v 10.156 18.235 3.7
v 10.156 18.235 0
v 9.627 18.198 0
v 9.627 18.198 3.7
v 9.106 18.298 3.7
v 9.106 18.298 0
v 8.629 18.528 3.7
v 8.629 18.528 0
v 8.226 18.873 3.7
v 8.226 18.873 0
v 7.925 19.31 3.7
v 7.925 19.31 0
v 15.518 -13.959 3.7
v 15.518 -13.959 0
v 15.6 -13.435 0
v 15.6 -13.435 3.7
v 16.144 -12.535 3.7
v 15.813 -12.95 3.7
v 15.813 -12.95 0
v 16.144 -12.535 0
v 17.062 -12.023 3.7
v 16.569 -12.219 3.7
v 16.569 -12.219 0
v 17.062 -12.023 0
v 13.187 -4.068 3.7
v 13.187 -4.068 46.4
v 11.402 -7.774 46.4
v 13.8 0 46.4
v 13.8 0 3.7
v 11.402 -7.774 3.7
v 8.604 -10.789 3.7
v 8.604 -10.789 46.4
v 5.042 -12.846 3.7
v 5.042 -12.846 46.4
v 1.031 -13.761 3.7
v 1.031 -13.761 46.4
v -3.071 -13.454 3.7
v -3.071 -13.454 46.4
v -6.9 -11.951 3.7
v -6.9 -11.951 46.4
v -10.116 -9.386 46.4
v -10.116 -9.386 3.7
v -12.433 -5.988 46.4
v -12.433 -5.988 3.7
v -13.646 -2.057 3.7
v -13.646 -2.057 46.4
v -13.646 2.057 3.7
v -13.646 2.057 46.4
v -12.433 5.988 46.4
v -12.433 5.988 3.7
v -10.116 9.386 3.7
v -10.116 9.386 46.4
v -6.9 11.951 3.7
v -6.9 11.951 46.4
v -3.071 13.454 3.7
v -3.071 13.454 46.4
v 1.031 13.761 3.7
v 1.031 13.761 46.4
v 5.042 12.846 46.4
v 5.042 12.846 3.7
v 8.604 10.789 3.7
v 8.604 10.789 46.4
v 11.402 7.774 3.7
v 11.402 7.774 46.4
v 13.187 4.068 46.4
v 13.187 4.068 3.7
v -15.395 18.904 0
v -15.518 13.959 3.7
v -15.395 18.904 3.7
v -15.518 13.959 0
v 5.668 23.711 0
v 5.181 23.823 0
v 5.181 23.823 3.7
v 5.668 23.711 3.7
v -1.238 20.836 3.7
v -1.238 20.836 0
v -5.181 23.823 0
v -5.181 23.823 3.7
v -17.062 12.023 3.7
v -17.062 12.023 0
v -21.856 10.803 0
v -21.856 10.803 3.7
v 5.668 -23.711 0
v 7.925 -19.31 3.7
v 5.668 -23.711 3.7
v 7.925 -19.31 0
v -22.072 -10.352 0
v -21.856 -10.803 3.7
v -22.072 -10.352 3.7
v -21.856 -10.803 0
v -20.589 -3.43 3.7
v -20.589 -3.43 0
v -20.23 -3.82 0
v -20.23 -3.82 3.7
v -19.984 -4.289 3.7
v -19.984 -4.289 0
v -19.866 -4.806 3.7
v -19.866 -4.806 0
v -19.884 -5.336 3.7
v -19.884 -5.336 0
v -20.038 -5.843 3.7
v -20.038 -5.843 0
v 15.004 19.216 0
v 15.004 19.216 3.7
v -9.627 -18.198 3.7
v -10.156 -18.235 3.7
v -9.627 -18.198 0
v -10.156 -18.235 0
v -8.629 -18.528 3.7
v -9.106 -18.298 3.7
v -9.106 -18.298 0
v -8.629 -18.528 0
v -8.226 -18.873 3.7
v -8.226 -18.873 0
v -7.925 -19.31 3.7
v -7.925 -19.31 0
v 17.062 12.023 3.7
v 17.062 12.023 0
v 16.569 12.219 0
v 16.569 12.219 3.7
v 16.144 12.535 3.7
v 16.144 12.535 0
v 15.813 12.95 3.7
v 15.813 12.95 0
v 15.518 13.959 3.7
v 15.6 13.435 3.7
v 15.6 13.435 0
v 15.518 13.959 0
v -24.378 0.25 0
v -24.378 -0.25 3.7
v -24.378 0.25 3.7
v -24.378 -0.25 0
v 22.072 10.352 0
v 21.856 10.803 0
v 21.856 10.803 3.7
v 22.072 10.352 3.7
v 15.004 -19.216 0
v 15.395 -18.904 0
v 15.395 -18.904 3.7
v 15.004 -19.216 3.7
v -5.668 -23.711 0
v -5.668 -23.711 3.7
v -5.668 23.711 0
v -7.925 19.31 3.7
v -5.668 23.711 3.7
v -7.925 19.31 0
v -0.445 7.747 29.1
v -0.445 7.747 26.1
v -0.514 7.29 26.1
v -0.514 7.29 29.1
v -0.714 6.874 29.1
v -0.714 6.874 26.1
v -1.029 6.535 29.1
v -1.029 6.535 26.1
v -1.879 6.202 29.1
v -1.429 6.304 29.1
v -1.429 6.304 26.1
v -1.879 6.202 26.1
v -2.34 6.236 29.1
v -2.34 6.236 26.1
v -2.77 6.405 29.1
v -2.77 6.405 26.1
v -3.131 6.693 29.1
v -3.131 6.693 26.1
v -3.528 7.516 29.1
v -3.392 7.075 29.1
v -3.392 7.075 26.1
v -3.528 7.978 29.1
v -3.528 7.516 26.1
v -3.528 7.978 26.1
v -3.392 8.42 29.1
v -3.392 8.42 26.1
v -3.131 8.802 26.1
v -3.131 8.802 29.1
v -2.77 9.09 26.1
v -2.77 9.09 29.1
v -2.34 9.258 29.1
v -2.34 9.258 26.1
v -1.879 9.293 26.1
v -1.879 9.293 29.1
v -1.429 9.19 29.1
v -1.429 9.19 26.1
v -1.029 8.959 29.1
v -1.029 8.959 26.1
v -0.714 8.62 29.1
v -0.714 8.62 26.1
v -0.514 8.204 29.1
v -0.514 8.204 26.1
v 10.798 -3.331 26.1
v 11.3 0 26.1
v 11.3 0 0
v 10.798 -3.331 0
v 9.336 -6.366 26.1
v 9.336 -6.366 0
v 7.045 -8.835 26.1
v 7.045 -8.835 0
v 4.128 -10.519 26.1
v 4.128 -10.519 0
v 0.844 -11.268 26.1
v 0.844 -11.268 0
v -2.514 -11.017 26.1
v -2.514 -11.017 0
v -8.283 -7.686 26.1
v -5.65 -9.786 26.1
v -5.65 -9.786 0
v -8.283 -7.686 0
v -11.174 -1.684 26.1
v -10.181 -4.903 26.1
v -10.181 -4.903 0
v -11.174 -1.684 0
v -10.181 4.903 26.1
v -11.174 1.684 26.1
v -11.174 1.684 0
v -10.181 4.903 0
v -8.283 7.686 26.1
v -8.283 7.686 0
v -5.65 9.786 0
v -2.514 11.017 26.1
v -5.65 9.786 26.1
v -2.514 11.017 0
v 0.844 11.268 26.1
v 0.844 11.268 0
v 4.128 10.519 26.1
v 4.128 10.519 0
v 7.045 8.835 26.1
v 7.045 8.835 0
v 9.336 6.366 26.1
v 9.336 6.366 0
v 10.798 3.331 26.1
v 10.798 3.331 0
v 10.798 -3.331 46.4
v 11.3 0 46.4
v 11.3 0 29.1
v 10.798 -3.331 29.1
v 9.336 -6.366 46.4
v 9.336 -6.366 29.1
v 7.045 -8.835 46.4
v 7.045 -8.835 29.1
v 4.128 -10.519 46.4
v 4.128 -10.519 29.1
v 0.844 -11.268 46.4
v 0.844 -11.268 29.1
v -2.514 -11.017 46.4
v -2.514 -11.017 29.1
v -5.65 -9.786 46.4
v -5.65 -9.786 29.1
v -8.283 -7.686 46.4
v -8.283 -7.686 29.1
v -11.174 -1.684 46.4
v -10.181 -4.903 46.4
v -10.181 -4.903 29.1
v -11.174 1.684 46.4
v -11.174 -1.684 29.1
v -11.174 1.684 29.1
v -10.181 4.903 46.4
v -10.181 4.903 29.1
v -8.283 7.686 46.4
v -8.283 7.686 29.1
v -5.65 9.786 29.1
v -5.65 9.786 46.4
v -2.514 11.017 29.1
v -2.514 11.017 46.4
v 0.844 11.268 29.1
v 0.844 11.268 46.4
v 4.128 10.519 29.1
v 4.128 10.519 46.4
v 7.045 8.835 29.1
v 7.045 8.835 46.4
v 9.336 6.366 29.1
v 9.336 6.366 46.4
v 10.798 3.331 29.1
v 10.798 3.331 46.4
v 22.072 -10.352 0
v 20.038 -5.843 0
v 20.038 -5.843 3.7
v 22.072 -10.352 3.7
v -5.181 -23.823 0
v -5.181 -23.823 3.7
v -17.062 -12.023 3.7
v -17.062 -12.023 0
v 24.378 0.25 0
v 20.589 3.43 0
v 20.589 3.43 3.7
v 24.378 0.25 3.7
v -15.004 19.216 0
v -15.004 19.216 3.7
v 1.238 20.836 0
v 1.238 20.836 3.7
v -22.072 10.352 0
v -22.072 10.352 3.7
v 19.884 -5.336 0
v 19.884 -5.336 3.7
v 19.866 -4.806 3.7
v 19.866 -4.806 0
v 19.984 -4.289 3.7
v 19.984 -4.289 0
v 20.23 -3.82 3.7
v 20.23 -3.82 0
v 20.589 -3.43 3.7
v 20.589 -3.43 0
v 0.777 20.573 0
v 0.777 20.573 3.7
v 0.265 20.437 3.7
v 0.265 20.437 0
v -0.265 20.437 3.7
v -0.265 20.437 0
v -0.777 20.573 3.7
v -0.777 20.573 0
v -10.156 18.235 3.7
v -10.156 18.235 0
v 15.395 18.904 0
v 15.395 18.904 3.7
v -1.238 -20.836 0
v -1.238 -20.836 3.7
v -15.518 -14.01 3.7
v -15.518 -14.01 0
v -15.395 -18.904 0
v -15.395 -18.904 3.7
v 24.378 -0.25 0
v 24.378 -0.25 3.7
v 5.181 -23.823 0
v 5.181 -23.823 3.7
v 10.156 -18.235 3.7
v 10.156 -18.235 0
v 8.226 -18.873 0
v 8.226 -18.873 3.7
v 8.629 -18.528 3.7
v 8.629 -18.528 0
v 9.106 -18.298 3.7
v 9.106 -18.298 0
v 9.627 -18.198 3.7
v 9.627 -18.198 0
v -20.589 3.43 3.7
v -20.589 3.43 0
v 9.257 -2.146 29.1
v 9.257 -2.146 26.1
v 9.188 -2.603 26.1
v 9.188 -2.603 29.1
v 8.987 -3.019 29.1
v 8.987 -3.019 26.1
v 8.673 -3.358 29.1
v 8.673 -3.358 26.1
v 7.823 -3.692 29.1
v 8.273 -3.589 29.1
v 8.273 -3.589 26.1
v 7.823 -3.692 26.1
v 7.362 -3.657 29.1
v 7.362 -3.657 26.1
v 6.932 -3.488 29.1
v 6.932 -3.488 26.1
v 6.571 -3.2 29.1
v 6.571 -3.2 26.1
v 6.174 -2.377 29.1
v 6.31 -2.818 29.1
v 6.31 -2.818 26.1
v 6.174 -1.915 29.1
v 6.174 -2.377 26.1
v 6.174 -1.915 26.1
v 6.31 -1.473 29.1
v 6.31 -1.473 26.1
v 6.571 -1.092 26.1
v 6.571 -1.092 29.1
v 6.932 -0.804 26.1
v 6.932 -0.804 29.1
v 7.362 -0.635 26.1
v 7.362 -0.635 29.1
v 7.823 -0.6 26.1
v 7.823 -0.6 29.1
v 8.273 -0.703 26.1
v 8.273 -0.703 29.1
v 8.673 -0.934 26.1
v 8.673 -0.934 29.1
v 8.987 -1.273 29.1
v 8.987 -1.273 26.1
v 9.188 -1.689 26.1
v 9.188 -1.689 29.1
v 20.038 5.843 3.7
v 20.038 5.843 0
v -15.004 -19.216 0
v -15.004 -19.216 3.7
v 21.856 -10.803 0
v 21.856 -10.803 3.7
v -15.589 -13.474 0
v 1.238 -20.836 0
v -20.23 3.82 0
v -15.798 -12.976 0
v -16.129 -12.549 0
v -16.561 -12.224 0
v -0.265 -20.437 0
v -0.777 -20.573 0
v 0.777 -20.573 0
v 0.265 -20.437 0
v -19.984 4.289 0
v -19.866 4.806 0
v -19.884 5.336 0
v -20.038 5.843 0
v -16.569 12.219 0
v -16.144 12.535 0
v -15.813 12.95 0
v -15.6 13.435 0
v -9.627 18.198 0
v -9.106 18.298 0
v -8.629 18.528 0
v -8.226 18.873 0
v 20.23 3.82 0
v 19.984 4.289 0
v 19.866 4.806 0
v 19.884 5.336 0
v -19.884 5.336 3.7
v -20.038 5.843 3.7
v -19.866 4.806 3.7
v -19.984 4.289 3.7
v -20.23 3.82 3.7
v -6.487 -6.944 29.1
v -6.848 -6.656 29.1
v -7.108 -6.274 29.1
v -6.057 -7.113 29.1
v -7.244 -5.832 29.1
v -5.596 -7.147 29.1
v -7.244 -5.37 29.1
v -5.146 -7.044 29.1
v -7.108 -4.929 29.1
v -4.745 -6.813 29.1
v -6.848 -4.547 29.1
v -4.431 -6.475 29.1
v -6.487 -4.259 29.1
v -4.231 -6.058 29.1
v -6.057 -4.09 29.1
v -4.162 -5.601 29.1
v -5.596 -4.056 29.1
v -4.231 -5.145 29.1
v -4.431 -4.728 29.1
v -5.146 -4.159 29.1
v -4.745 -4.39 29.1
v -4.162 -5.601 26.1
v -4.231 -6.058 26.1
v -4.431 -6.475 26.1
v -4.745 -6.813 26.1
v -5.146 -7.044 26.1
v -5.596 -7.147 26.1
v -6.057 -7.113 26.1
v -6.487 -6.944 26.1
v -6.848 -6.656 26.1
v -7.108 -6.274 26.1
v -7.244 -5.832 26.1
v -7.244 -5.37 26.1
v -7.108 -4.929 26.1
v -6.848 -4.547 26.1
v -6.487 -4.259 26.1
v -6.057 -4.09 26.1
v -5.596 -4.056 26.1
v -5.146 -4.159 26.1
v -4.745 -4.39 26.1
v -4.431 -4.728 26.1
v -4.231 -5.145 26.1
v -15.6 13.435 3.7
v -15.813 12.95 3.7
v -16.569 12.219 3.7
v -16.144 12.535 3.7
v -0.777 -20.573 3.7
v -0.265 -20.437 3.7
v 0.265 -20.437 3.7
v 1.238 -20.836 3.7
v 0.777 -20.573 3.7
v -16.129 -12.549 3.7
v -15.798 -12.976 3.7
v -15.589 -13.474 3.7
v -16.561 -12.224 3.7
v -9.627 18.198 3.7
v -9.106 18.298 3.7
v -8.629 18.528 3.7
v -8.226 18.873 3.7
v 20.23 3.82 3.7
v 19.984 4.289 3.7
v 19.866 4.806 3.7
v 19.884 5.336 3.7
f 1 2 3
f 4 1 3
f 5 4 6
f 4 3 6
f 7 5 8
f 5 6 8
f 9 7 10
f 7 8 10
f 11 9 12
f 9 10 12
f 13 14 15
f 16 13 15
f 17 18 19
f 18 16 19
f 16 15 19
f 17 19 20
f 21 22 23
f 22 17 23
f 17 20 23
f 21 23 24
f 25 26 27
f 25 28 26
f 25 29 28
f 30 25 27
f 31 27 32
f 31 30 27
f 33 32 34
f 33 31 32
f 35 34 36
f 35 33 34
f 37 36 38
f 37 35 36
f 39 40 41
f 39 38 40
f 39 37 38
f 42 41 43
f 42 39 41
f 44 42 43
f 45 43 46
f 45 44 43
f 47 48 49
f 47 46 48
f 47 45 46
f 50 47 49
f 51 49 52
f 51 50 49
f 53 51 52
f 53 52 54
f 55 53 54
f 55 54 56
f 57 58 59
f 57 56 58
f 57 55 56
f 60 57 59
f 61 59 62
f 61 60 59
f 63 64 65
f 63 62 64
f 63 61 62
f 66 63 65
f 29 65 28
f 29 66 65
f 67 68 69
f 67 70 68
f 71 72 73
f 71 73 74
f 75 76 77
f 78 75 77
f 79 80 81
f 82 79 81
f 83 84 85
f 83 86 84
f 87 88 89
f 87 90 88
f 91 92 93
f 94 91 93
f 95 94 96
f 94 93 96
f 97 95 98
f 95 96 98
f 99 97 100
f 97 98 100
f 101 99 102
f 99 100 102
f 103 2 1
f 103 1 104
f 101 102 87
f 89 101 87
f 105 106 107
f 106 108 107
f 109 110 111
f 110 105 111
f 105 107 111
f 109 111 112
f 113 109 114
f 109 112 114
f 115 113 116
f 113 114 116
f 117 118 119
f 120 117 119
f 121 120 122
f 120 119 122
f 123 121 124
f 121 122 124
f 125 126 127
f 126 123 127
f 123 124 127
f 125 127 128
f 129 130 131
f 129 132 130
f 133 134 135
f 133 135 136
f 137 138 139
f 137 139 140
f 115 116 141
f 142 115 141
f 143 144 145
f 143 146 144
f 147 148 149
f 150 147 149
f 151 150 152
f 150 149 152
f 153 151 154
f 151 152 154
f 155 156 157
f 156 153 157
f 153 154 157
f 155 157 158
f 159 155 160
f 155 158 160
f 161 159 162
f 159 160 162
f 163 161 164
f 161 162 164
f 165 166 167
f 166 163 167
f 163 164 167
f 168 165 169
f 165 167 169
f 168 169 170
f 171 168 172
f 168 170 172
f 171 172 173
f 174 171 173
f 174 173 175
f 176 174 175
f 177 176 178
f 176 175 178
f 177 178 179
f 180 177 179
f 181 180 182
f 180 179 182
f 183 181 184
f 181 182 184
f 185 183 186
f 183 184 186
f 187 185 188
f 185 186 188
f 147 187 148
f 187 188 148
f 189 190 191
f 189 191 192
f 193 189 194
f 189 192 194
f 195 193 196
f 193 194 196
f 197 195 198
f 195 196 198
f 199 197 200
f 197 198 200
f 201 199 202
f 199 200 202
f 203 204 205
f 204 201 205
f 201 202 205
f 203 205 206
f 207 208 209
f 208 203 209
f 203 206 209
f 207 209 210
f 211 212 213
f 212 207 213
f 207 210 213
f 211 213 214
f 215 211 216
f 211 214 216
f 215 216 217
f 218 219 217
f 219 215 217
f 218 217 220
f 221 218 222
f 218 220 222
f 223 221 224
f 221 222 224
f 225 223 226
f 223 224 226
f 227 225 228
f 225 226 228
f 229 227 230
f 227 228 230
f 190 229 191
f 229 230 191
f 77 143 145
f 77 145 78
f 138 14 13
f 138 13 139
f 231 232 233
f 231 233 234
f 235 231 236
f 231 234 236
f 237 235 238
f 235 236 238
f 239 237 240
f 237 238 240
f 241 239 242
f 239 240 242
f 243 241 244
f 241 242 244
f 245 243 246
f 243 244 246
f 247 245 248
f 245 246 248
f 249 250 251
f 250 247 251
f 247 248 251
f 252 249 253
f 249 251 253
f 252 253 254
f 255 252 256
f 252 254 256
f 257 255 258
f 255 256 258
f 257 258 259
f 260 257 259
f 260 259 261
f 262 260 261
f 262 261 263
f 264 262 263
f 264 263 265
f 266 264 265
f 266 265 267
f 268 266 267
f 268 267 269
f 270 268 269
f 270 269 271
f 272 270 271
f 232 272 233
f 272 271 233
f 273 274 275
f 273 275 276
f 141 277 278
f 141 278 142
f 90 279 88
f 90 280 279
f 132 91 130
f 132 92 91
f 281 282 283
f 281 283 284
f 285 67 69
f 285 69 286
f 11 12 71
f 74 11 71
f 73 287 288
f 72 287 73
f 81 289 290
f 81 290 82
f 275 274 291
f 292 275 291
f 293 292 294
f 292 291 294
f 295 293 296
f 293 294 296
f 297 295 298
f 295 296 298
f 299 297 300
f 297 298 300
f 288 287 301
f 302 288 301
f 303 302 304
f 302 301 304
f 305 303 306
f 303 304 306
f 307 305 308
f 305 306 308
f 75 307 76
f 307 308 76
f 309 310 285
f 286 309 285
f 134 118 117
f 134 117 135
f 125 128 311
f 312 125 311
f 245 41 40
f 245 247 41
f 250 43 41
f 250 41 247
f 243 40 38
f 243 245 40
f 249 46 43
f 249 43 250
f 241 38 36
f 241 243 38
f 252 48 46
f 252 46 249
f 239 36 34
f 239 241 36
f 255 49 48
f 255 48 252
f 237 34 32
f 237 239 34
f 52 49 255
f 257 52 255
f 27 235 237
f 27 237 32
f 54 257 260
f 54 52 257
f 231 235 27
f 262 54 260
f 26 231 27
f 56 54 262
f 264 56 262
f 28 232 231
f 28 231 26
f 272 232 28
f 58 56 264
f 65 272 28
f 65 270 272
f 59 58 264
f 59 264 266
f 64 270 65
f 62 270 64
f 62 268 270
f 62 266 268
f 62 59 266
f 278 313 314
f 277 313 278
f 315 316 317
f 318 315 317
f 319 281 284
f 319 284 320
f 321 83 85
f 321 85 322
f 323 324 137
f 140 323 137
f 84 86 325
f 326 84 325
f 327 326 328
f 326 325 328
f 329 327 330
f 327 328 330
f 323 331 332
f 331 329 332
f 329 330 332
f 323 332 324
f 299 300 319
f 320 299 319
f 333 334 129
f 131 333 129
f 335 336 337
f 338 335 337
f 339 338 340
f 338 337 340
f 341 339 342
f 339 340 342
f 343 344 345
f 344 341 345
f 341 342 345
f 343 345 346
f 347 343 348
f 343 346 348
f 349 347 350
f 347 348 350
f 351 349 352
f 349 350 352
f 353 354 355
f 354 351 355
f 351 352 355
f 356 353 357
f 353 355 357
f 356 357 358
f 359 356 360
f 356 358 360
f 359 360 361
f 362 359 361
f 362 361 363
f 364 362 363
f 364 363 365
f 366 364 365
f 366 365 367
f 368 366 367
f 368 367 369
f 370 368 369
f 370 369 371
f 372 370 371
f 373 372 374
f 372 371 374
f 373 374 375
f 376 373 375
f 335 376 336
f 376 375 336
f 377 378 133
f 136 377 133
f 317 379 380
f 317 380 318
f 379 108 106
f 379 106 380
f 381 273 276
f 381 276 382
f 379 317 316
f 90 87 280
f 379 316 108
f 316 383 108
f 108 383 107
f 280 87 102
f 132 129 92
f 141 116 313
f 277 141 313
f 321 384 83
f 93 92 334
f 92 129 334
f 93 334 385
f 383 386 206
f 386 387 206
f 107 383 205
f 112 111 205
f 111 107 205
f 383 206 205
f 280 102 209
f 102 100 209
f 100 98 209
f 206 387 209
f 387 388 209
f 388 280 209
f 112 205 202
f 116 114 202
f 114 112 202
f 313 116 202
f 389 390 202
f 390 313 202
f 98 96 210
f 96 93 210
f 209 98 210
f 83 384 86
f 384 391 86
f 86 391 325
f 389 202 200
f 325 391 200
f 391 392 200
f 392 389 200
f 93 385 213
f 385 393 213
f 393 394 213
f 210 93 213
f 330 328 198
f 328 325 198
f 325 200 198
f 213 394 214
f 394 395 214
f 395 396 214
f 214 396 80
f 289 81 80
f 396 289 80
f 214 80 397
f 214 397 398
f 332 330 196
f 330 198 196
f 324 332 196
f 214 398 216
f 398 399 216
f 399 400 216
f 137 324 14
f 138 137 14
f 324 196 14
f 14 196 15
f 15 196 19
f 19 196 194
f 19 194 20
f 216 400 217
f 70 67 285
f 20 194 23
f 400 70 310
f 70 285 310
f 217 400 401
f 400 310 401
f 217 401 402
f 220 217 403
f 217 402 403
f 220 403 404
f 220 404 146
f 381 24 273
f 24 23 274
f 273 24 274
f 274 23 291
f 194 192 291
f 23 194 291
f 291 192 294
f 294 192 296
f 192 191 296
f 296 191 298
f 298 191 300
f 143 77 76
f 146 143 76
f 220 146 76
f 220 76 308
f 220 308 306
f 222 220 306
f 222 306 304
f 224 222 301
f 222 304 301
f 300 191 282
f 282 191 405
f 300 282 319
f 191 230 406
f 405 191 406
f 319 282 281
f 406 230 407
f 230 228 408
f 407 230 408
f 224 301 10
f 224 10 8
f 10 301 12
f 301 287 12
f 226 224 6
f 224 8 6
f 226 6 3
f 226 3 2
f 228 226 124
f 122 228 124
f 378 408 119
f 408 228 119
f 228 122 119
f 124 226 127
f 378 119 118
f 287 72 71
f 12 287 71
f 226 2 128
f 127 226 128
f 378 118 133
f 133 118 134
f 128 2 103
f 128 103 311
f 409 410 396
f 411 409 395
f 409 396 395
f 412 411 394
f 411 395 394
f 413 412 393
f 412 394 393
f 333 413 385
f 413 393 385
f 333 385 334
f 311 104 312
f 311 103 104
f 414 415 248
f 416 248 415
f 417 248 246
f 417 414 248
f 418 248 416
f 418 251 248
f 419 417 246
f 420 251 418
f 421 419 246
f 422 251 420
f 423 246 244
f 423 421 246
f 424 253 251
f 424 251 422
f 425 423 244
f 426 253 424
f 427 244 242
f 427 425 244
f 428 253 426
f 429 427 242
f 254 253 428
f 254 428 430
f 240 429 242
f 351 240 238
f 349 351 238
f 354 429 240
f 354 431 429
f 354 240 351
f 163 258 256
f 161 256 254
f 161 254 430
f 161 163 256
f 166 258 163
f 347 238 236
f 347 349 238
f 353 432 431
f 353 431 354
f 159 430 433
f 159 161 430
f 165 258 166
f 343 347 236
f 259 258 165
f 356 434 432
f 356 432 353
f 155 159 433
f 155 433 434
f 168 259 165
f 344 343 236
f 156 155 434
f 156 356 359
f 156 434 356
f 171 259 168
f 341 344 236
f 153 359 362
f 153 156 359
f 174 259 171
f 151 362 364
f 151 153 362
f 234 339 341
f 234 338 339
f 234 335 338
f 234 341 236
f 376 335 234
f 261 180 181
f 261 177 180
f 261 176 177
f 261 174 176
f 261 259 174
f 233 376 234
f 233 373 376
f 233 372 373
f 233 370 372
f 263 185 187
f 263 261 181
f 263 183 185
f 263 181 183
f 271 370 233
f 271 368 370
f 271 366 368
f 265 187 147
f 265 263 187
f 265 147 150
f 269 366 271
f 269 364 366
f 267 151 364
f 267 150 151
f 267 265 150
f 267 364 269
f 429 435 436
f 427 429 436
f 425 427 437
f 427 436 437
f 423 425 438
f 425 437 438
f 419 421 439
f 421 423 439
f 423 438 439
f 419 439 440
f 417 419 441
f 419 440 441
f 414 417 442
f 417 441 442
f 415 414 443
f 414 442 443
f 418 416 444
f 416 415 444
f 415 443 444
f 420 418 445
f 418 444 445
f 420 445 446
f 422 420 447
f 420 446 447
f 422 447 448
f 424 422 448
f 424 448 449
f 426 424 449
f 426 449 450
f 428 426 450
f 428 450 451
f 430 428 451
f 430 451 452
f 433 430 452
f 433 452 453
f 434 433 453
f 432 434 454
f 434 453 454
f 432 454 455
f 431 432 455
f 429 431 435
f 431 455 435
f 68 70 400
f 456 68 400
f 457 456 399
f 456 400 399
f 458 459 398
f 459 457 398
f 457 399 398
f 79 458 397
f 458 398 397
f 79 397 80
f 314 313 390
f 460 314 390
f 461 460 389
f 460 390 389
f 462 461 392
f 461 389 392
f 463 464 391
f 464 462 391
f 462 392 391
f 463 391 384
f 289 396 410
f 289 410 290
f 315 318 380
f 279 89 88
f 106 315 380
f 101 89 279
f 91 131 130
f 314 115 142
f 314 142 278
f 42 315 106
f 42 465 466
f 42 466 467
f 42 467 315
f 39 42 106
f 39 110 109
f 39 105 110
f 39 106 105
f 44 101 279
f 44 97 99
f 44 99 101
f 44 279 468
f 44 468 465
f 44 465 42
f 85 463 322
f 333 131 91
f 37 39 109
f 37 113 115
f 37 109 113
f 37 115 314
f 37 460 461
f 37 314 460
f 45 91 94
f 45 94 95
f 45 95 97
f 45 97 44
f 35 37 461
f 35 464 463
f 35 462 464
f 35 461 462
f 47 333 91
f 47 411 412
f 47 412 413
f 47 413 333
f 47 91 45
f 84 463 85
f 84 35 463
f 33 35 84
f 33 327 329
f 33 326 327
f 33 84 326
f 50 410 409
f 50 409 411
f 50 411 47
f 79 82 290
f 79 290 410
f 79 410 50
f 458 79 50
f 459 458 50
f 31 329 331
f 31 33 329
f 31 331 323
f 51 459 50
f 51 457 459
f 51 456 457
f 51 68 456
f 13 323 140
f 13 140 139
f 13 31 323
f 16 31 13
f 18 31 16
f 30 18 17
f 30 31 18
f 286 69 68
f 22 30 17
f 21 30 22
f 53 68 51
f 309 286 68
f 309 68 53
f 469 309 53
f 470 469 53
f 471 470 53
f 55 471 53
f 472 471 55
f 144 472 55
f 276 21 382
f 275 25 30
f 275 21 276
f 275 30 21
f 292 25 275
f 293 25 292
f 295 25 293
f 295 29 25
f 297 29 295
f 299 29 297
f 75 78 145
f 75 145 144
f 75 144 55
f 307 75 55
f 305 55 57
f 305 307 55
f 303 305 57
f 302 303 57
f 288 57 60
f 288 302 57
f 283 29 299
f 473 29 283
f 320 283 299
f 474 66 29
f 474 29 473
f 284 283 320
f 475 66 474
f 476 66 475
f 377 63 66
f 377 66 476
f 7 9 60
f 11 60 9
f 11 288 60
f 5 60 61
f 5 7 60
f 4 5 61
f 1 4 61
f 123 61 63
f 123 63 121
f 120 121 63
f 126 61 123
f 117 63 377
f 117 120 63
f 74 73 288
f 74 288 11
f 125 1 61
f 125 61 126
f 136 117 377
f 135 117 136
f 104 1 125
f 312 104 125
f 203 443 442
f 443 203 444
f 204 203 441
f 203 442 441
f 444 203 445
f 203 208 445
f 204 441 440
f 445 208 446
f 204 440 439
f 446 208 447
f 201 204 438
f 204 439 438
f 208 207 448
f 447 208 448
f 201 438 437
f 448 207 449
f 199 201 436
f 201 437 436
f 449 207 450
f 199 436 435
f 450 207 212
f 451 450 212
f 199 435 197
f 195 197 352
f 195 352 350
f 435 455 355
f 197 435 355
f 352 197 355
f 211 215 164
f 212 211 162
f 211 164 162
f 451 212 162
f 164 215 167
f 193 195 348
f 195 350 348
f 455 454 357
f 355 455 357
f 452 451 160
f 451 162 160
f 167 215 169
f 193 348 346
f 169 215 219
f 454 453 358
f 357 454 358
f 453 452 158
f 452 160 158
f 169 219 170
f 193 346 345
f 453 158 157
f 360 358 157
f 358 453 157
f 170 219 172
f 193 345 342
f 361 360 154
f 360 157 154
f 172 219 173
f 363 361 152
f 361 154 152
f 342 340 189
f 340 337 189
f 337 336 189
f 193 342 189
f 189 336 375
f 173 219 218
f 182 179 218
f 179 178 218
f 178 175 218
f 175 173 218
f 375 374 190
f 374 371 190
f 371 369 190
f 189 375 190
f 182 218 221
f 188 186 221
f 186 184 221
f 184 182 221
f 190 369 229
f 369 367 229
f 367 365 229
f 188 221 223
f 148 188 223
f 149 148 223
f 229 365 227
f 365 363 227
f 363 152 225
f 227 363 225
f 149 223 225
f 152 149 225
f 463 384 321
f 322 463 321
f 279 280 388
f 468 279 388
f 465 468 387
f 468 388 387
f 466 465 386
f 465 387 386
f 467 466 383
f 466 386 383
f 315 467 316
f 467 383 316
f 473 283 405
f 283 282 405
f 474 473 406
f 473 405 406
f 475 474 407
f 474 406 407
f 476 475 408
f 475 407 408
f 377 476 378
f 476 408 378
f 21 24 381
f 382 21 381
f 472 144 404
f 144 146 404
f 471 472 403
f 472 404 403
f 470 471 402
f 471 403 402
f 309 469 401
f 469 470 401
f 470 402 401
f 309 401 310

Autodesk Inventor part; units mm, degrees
ref_plane "YZ Plane" through (0, 0, 0) normal (1, 0, 0) x (0, 1, 0)
ref_plane "XZ Plane" through (0, 0, 0) normal (0, 1, 0) x (-1, 0, 0)
ref_plane "XY Plane" through (0, 0, 0) normal (0, 0, 1) x (1, 0, 0)
sketch "Эскиз1" plane through (0, 0, 0) normal (0, 0, 1) x (1, 0, 0)
  circle A0 centre (0, 0) radius 22.47
  line L0 (21.9066, 5) -> (21.9066, -5)
  circle A1 centre (21.9066, -5) radius 2.05
  circle A2 centre (21.9066, 5) radius 2.05
  line L1 (21.9066, 5) -> (0, 0)
  line L2 (0, 0) -> (21.9066, -5)
  line L3 (21.9066, 5) -> (13.9325, -4.5032)
  circle A3 centre (0, 0) radius 15.4921
  line L4 (20.5889, 3.4296) -> (24.3782, 0.25)
  line L5 (0, 0) -> (4.0279, 0)
  line L6 (20.5889, -3.4296) -> (24.3782, -0.25)
  line L7 (24.3782, 0.25) -> (24.3782, -0.25)
  line L8 (21.9066, -5) -> (14.1251, 4.2737)
  line L9 (21.8556, 10.8026) -> (22.0725, 10.3521)
  circle A4 centre (21.9066, 5.0001) radius 2.05
  line L10 (20.038, 5.8432) -> (22.0725, 10.3521)
  line L11 (17.0619, 12.0232) -> (21.8556, 10.8026)
  circle A5 centre (17.5678, 14.0098) radius 2.05
  line L12 (15.0041, 19.2155) -> (15.395, 18.9038)
  circle A6 centre (17.5677, 14.0099) radius 2.05
  line L13 (15.5184, 13.9587) -> (15.395, 18.9038)
  line L14 (10.1556, 18.2354) -> (15.0041, 19.2155)
  circle A7 centre (9.7494, 20.2448) radius 2.05
  line L15 (5.1809, 23.8227) -> (5.6684, 23.7114)
  circle A8 centre (9.7493, 20.2448) radius 2.05
  line L16 (7.9251, 19.3096) -> (5.6684, 23.7114)
  line L17 (1.2378, 20.8359) -> (5.1809, 23.8227)
  circle A9 centre (0, 22.47) radius 2.05
  line L18 (-5.6684, 23.7114) -> (-5.1809, 23.8227)
  circle A10 centre (0, 22.47) radius 2.05
  line L19 (-1.2378, 20.8359) -> (-5.1809, 23.8227)
  line L20 (-7.9251, 19.3096) -> (-5.6684, 23.7114)
  circle A11 centre (-9.7493, 20.2448) radius 2.05
  line L21 (-15.395, 18.9038) -> (-15.0041, 19.2155)
  circle A12 centre (-9.7494, 20.2448) radius 2.05
  line L22 (-10.1556, 18.2354) -> (-15.0041, 19.2155)
  line L23 (-15.5184, 13.9587) -> (-15.395, 18.9038)
  circle A13 centre (-17.5677, 14.0099) radius 2.05
  line L24 (-22.0725, 10.3521) -> (-21.8556, 10.8026)
  circle A14 centre (-17.5678, 14.0098) radius 2.05
  line L25 (-17.0619, 12.0232) -> (-21.8556, 10.8026)
  line L26 (-20.038, 5.8432) -> (-22.0725, 10.3521)
  circle A15 centre (-21.9066, 5.0001) radius 2.05
  line L27 (-24.3782, -0.25) -> (-24.3782, 0.25)
  circle A16 centre (-21.9066, 5) radius 2.05
  line L28 (-20.5889, 3.4296) -> (-24.3782, 0.25)
  line L29 (-20.5889, -3.4296) -> (-24.3782, -0.25)
  circle A17 centre (-21.9066, -5) radius 2.05
  line L30 (-21.8556, -10.8026) -> (-22.0725, -10.3521)
  circle A18 centre (-21.9066, -5.0001) radius 2.05
  line L31 (-20.038, -5.8432) -> (-22.0725, -10.3521)
  line L32 (-17.0619, -12.0232) -> (-21.8556, -10.8026)
  circle A19 centre (-17.5678, -14.0098) radius 2.05
  line L33 (-15.0041, -19.2155) -> (-15.395, -18.9038)
  circle A20 centre (-17.5677, -14.0099) radius 2.05
  line L34 (-15.5184, -13.9587) -> (-15.395, -18.9038)
  line L35 (-10.1556, -18.2354) -> (-15.0041, -19.2155)
  circle A21 centre (-9.7494, -20.2448) radius 2.05
  line L36 (-5.1809, -23.8227) -> (-5.6684, -23.7114)
  circle A22 centre (-9.7493, -20.2448) radius 2.05
  line L37 (-7.9251, -19.3096) -> (-5.6684, -23.7114)
  line L38 (-1.2378, -20.8359) -> (-5.1809, -23.8227)
  circle A23 centre (0, -22.47) radius 2.05
  line L39 (5.6684, -23.7114) -> (5.1809, -23.8227)
  circle A24 centre (0, -22.47) radius 2.05
  line L40 (1.2378, -20.8359) -> (5.1809, -23.8227)
  line L41 (7.9251, -19.3096) -> (5.6684, -23.7114)
  circle A25 centre (9.7493, -20.2448) radius 2.05
  line L42 (15.395, -18.9038) -> (15.0041, -19.2155)
  circle A26 centre (9.7494, -20.2448) radius 2.05
  line L43 (10.1556, -18.2354) -> (15.0041, -19.2155)
  line L44 (15.5184, -13.9587) -> (15.395, -18.9038)
  circle A27 centre (17.5677, -14.0099) radius 2.05
  line L45 (22.0725, -10.3521) -> (21.8556, -10.8026)
  circle A28 centre (17.5678, -14.0098) radius 2.05
  line L46 (17.0619, -12.0232) -> (21.8556, -10.8026)
  line L47 (20.038, -5.8432) -> (22.0725, -10.3521)
  circle A29 centre (21.9066, -5.0001) radius 2.05
  line L48 (22.3878, 1.9202) -> (22.3878, -1.9202)
  circle A30 centre (0, 0) radius 11.3
  point P0 (21.9066, 0)
  point P1 (19.908, 4.5439)
  point P2 (15.965, 12.7317)
  point P3 (8.8599, 18.3978)
  point P4 (0, 20.42)
  point P5 (-8.8599, 18.3978)
  point P6 (-15.965, 12.7317)
  point P7 (-19.908, 4.5439)
  point P8 (-19.908, -4.5439)
  point P9 (-15.965, -12.7317)
  point P10 (-8.8599, -18.3978)
  point P11 (0, -20.42)
  point P12 (8.8599, -18.3978)
  point P13 (15.965, -12.7317)
  point P14 (19.908, -4.5439)
  point P15 (11.0167, -2.5145)
  point P16 (11.0167, 2.5145)
  point P17 (15.1037, 3.4473)
  point P18 (15.1037, -3.4473)
  dimension "d3" = 4.1
  dimension "d0" = 44.94
  dimension "d1" = 10
  dimension "d2" = 4.1
  dimension "d4" = 40
  dimension "d6" = 40
  dimension "d9" = 360
  dimension "d13" = 0.5
  dimension "d23" = 3.8403
  dimension "d24" = 22.6
extrude "Выдавливание1" add sketch "Эскиз1" along normal blind 3.7 contours A0 L48 | A0 L4 L7 L6 | L48 L6 L0 L4 | L0 L6 L8 L3 L4 | L3 L8 A3 L1 A2 | A1 L2 A3 L3 L8 | L1 A3 L2 A1 L47 A0 L46 A27 L44 L43 A25 L41 L40 A23 L38 L37 A21 L35 L34 A19 L32 L31 A17 L29 L28 A15 L26 L25 A13 L23 L22 A11 L20 L19 A9 L17 L16 A7 L14 L13 A5 L11 L10 A2 | L3 A3 L8 | A0 L11 L9 L10 | A3 L8 L1 | L1 A30 L2 A3 | A3 L2 L3 | L3 L2 A30 L1 L8 A3 | L47 L45 L46 A0 | A0 L14 L12 L13 | L44 L42 L43 A0 | A0 L17 L15 L16 | L41 L39 L40 A0 | A0 L20 L18 L19 | L38 L36 L37 A0 | A0 L23 L21 L22 | L35 L33 L34 A0 | A0 L26 L24 L25 | L32 L30 L31 A0 | A0 L29 L27 L28
sketch "Эскиз5" plane through (0, 0, 3.7) normal (0, 0, 1) x (1, 0, 0)
  circle A0 centre (0, 0) radius 13.8
  circle A1 centre (0, 0) radius 11.3 projected
  dimension "d25" = 2.5
extrude "Выдавливание3" add sketch "Эскиз5" along normal blind 22.4
sketch "Эскиз6" plane through (0, 0, 26.1) normal (0, 0, 1) x (1, 0, 0)
  circle A0 centre (0, 0) radius 13.8
  circle A1 centre (-1.995, 7.7473) radius 1.55 projected
  circle A2 centre (7.7068, -2.1459) radius 1.55 projected
  circle A3 centre (-5.7118, -5.6014) radius 1.55 projected
extrude "Выдавливание4" add sketch "Эскиз6" along normal blind 3
sketch "Эскиз7" plane through (0, 0, 29.1) normal (0, 0, 1) x (1, 0, 0)
  circle A0 centre (0, 0) radius 11.3 projected
  circle A1 centre (0, 0) radius 13.8 projected
extrude "Выдавливание5" add sketch "Эскиз7" along normal blind 17.3
equation "\"d2\" = d3"
properties part number "ВедущееКолесо" material "Пластик ЖКП"
